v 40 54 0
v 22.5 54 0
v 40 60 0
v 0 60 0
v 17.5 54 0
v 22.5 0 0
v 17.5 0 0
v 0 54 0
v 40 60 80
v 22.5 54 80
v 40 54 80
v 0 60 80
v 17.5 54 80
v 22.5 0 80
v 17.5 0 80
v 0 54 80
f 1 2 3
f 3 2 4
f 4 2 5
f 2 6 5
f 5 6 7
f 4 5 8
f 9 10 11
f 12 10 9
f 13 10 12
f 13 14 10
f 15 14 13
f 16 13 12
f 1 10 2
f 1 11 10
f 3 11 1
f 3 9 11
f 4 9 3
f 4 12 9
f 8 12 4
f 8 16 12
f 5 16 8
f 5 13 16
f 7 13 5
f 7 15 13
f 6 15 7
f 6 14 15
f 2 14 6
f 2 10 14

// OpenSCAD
$fn = 32;

// ----------------------------------------------------------------------
// Structural section: tee 40 x 60 mm
// ----------------------------------------------------------------------

// --- parameters (mm) ---
sec_w = 40;               // tee width, X
sec_h = 60;               // tee height, Y
flange_t = 6;             // top flange thickness
web_t = 5;                // web thickness
plate_t = 80;             // cut length, Z (extrusion height)

profile = [[17.5, 0], [22.5, 0], [22.5, 54], [40, 54], [40, 60], [0, 60], [0, 54], [17.5, 54]];  // primary outline, 8 points, counter clockwise

// --- the one profile operation ---
linear_extrude(height = plate_t) polygon(points = profile);
